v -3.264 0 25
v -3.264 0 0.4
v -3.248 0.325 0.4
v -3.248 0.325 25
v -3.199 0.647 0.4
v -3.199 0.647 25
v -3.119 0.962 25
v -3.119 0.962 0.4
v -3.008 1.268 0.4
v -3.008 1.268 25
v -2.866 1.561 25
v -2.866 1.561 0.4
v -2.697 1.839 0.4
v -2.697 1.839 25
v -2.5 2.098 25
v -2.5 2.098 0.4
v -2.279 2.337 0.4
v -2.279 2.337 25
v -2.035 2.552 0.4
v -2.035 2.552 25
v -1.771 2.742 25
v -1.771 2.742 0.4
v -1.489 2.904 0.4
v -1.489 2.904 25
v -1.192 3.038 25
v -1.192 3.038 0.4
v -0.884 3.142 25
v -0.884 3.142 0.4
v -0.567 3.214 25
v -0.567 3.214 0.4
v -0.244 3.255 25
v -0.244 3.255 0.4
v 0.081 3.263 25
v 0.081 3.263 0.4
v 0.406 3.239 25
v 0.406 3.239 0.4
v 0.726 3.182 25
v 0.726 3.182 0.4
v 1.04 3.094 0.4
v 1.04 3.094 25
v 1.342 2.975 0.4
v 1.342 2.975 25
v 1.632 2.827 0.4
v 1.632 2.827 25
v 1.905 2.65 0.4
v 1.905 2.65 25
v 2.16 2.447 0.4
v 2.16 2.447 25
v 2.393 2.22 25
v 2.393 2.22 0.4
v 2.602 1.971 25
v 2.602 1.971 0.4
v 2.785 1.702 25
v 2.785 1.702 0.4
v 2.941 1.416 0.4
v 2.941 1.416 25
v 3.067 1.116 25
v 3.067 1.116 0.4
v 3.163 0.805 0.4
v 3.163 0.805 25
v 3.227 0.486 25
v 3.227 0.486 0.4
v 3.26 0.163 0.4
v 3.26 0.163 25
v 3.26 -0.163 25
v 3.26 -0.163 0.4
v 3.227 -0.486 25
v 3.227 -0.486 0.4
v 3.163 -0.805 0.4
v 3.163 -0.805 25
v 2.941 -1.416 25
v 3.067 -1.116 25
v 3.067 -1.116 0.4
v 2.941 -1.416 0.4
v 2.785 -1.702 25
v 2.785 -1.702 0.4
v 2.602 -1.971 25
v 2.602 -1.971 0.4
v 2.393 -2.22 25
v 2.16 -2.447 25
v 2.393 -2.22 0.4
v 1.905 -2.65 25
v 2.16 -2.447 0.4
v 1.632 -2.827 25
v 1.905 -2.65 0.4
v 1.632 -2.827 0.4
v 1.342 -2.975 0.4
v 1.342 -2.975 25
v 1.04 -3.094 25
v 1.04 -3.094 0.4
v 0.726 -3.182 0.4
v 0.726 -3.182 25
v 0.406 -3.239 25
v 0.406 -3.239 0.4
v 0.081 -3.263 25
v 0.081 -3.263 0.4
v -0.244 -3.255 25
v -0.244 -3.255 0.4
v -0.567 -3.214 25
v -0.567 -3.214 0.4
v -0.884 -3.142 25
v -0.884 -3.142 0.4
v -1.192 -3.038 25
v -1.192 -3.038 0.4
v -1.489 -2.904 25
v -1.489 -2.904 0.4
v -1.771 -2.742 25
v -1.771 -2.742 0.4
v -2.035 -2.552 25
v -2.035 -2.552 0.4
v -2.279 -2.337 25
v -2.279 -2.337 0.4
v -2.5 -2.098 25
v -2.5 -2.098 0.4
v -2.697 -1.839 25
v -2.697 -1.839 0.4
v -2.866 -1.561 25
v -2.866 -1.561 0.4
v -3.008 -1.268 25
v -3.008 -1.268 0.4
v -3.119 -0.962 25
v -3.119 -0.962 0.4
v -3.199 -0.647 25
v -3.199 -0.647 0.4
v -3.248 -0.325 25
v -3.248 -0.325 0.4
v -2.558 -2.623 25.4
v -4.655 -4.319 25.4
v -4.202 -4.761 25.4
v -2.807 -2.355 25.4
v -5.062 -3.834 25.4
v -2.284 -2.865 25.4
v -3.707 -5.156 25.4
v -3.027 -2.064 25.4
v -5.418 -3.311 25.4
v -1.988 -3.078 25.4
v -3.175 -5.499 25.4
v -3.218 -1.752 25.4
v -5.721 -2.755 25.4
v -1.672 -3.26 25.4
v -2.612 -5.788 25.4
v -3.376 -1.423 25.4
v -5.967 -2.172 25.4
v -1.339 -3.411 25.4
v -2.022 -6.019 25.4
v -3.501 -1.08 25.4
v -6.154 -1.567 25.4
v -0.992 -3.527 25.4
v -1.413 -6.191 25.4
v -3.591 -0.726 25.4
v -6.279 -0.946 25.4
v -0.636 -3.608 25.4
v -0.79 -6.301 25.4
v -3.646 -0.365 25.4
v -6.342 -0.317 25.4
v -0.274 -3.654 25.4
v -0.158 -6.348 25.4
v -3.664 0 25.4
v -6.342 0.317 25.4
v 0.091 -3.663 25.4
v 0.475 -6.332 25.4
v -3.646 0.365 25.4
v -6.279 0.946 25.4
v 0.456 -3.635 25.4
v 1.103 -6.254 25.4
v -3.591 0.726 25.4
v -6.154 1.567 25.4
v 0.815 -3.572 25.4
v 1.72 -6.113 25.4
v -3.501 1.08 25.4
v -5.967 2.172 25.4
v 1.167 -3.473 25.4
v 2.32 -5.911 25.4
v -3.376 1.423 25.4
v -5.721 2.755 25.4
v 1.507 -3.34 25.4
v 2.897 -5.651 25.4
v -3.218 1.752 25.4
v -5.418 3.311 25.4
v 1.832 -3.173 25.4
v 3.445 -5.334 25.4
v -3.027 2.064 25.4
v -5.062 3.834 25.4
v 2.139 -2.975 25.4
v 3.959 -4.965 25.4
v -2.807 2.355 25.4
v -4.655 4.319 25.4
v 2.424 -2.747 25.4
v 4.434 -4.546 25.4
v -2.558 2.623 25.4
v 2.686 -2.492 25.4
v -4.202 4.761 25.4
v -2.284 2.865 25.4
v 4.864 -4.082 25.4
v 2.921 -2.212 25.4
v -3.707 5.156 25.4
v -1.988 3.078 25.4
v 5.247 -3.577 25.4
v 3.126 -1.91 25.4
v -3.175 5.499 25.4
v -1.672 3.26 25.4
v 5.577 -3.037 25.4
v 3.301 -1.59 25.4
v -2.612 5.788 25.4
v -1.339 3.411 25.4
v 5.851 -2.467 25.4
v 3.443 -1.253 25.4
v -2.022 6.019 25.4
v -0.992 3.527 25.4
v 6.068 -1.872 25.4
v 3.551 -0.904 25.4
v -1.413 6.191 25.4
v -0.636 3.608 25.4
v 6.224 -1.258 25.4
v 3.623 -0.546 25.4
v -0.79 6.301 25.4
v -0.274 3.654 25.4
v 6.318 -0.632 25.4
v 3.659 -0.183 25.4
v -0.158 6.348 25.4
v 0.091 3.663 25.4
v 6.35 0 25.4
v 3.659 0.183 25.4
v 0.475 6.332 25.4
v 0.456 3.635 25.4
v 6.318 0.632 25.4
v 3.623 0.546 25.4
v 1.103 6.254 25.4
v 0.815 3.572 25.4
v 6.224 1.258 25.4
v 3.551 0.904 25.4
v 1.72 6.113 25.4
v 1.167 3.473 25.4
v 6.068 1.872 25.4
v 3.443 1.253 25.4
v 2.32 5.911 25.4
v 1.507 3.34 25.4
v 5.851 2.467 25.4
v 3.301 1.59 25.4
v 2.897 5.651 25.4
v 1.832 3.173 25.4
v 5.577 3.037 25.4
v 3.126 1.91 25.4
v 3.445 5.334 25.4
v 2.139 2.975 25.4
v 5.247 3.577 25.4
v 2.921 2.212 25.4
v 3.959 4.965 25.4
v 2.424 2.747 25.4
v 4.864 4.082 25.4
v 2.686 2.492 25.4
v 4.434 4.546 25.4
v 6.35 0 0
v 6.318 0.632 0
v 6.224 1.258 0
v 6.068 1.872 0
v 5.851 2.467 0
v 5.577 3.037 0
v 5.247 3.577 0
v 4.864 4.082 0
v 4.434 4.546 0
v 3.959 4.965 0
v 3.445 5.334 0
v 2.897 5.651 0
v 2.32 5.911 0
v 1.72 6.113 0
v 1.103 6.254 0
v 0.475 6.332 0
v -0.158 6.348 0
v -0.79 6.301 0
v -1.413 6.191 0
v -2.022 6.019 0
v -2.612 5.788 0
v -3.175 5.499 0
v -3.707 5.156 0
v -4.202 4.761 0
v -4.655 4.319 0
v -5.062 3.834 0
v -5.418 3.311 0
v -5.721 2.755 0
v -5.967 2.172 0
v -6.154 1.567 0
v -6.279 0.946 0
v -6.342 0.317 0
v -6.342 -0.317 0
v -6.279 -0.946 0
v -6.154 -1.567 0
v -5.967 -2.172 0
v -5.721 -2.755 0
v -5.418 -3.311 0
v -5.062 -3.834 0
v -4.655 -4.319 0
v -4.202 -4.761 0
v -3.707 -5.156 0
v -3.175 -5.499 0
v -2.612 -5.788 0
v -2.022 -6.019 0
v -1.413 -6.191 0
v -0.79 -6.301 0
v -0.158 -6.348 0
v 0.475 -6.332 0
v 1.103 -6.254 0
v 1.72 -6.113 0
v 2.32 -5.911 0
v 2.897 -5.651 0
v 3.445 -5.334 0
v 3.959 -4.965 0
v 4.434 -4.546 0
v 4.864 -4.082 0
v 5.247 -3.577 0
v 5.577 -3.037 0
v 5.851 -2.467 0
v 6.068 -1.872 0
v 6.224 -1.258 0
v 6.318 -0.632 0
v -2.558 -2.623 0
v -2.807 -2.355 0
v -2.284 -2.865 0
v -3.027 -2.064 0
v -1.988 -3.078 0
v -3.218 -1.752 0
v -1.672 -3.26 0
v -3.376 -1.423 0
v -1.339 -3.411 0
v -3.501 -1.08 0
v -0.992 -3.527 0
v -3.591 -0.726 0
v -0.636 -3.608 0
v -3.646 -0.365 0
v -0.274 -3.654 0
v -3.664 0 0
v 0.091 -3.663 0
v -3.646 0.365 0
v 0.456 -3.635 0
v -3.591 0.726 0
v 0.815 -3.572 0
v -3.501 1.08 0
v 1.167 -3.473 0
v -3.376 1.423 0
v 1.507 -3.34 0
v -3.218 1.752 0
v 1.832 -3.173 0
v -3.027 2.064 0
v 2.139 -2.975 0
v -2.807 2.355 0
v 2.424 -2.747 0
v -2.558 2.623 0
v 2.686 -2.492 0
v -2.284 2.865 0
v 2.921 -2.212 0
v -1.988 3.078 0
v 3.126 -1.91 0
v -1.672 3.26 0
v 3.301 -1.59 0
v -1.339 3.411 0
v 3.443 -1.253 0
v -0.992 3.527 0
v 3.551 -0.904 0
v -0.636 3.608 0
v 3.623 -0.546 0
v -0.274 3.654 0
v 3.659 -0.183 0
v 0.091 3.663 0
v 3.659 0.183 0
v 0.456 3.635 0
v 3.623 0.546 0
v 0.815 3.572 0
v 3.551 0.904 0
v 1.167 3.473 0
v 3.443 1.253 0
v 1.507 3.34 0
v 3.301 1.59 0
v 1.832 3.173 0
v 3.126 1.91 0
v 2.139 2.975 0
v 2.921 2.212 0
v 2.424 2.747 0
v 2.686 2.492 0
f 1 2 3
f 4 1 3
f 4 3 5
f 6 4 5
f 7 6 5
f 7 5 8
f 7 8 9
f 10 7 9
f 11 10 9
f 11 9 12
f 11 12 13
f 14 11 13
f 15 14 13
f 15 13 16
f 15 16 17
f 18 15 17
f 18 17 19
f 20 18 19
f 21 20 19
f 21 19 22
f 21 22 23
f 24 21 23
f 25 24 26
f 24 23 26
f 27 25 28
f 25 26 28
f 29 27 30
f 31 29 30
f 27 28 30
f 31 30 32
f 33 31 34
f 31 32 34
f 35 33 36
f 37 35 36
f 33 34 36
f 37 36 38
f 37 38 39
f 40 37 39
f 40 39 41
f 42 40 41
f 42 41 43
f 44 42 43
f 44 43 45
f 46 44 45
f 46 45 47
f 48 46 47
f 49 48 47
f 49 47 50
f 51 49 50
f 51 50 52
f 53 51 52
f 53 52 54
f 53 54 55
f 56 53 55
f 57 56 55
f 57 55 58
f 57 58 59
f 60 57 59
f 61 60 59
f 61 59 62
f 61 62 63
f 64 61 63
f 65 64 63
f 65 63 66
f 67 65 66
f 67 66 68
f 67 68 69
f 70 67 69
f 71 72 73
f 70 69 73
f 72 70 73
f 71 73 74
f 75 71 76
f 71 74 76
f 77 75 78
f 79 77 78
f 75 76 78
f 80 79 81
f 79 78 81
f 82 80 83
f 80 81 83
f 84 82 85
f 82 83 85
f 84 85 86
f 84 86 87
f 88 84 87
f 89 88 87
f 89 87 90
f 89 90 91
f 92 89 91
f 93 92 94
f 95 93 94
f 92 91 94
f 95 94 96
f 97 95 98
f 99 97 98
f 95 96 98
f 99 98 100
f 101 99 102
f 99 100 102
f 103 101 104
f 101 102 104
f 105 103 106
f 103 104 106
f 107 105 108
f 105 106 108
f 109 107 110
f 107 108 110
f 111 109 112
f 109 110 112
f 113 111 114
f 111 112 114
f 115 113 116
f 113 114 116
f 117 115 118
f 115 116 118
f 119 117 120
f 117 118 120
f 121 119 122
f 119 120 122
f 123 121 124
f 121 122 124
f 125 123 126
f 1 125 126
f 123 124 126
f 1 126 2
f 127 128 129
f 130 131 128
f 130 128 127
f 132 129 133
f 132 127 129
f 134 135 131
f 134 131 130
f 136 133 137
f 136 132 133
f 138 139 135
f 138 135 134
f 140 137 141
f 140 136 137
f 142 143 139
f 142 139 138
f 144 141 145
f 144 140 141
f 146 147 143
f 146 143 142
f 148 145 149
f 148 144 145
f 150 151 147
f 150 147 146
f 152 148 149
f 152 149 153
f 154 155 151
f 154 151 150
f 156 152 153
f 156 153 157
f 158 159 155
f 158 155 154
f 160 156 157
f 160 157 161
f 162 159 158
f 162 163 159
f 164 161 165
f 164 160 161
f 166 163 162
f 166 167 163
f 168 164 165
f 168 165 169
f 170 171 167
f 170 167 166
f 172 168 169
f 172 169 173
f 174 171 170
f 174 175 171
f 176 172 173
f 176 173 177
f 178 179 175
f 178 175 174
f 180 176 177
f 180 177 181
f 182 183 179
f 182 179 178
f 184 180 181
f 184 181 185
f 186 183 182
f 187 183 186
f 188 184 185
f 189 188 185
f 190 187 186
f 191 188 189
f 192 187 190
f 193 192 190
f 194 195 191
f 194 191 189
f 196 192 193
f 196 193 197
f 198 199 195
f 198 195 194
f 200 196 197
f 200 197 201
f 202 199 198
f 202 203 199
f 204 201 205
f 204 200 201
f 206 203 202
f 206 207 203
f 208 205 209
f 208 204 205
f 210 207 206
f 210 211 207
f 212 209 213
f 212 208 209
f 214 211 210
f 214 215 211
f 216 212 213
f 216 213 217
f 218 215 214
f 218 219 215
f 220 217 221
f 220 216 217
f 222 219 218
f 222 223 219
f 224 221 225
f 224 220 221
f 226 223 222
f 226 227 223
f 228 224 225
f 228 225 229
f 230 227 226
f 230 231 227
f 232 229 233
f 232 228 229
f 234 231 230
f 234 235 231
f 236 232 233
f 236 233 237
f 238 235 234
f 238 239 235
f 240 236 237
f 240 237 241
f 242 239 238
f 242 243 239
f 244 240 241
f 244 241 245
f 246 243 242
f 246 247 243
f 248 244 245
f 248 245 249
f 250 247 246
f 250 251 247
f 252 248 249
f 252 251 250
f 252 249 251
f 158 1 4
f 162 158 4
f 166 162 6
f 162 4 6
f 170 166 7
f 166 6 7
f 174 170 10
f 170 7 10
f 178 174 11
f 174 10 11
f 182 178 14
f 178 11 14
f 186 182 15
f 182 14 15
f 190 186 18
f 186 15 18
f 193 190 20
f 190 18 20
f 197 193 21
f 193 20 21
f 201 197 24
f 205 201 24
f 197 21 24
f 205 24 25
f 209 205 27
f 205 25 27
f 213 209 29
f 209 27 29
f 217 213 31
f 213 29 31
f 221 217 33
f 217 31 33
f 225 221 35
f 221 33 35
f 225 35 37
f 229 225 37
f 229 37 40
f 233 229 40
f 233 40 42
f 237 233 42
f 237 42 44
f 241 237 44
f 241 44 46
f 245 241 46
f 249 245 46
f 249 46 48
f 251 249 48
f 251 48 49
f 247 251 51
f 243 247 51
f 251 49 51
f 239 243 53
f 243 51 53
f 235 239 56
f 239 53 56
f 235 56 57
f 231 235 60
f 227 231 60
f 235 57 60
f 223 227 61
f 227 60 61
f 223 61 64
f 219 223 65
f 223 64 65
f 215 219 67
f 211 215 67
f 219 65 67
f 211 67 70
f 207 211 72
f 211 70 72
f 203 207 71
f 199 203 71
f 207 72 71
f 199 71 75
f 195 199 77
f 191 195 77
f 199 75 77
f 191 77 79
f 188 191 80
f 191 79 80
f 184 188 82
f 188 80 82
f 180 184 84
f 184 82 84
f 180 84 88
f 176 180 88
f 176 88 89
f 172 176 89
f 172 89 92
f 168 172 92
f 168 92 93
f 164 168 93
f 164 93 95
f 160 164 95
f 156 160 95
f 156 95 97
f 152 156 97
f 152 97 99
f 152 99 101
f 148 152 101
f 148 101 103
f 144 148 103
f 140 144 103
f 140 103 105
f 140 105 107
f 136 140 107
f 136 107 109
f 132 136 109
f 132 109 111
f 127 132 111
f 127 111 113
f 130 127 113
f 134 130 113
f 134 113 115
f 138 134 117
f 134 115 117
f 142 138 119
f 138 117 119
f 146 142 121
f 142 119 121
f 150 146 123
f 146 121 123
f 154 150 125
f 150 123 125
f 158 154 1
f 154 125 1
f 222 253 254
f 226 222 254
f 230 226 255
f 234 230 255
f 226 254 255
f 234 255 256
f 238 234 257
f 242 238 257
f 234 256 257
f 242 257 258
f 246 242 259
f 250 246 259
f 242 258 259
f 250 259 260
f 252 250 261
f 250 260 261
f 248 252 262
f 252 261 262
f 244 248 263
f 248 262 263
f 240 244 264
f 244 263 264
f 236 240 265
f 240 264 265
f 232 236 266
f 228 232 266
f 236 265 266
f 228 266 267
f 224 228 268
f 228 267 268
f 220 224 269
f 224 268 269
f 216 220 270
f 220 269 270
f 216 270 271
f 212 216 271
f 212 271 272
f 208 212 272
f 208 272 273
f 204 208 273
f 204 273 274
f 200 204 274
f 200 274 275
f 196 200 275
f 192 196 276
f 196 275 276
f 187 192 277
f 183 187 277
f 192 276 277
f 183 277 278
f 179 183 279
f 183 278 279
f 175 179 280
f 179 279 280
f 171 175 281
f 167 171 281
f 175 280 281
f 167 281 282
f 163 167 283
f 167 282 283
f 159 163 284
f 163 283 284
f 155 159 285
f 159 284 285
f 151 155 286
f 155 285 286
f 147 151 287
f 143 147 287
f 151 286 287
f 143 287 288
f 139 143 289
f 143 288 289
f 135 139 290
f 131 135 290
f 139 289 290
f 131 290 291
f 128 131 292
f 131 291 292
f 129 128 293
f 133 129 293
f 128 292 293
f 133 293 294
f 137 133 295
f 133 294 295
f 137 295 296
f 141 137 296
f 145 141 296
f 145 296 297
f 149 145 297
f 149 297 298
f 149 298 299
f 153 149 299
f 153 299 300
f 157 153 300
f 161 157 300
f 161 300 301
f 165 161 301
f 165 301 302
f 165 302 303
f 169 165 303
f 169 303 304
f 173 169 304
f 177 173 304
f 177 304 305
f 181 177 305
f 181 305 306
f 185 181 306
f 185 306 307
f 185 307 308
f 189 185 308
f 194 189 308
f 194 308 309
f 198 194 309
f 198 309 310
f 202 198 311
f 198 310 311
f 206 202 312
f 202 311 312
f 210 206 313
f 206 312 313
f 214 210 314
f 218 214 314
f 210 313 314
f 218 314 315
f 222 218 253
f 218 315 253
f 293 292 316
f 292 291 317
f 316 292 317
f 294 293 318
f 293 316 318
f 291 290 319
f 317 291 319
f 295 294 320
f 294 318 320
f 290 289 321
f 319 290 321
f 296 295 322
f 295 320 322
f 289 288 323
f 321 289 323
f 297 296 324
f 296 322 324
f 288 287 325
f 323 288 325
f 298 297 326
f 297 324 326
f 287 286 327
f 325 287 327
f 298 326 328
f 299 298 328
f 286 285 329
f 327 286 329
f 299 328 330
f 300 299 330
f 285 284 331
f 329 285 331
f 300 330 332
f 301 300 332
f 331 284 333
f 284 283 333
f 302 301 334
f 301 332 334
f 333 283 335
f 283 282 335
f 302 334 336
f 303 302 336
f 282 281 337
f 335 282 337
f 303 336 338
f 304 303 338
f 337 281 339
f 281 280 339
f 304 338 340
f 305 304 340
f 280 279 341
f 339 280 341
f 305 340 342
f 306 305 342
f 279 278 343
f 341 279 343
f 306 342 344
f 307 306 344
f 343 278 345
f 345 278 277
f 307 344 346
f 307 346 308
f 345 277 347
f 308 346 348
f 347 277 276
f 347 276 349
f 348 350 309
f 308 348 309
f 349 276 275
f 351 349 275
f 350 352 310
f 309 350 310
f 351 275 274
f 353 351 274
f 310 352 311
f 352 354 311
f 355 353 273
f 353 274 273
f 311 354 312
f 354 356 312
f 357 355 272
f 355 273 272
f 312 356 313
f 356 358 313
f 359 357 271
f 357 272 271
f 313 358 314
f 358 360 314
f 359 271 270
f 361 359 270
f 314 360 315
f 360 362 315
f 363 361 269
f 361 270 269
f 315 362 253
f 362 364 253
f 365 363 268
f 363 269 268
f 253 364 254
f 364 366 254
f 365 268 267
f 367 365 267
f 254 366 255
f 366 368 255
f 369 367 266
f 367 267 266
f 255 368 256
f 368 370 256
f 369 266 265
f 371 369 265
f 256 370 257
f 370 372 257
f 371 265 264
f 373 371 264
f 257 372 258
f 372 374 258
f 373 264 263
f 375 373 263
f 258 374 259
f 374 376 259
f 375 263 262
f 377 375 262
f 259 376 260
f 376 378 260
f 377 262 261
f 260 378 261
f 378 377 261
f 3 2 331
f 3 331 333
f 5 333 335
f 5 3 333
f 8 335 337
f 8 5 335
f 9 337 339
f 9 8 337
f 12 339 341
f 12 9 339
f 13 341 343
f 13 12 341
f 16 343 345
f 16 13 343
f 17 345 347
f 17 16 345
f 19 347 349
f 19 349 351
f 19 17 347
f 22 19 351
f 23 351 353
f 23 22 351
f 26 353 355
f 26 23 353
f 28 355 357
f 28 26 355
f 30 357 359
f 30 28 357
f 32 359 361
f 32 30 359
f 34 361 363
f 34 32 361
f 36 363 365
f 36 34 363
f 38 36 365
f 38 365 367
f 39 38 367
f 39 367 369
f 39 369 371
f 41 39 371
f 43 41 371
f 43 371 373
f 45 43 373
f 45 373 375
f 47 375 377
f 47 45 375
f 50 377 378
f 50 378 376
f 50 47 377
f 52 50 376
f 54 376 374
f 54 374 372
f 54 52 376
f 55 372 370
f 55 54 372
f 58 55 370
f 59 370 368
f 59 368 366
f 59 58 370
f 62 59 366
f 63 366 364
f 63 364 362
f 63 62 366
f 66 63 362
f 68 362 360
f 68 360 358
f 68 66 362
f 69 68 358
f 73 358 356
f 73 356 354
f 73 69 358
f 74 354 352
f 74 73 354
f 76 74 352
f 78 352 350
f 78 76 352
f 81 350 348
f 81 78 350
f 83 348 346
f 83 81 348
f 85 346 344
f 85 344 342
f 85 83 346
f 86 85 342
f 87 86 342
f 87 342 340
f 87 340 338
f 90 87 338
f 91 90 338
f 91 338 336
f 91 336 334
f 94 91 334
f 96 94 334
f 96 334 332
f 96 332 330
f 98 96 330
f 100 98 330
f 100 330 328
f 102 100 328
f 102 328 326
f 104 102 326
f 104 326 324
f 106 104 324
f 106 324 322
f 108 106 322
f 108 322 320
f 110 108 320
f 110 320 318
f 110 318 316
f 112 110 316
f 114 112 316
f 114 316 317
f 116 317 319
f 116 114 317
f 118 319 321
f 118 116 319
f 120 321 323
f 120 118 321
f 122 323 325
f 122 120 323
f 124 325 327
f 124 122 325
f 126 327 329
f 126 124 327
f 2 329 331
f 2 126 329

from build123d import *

# Parameters (mm, degrees)
SKETCH1_R                = 6.35
BOSS_EXTRUDE1_DEPTH      = 25.4
F_0_257_DIAMETER_HOLE1_D = 6.5278
CHAMFER1_SIZE            = 0.4


with BuildPart() as part:
    # Sketch1 → Boss-Extrude1 (new body)
    with BuildSketch(Plane.XY):
        Circle(SKETCH1_R)
    extrude(amount=BOSS_EXTRUDE1_DEPTH)

    # F (0.257) Diameter Hole1 (through all)
    with Locations(Plane.XY.offset(25.4)):
        with Locations((0, 0)):
            Hole(F_0_257_DIAMETER_HOLE1_D / 2)

    # Chamfer1
    chamfer1_edges = [part.edges().sort_by_distance(p)[0] for p in [
        (3.2639, 0, 25.4),
        (3.2639, 0, 0),
    ]]
    chamfer(chamfer1_edges, length=CHAMFER1_SIZE)


solid = part.part
